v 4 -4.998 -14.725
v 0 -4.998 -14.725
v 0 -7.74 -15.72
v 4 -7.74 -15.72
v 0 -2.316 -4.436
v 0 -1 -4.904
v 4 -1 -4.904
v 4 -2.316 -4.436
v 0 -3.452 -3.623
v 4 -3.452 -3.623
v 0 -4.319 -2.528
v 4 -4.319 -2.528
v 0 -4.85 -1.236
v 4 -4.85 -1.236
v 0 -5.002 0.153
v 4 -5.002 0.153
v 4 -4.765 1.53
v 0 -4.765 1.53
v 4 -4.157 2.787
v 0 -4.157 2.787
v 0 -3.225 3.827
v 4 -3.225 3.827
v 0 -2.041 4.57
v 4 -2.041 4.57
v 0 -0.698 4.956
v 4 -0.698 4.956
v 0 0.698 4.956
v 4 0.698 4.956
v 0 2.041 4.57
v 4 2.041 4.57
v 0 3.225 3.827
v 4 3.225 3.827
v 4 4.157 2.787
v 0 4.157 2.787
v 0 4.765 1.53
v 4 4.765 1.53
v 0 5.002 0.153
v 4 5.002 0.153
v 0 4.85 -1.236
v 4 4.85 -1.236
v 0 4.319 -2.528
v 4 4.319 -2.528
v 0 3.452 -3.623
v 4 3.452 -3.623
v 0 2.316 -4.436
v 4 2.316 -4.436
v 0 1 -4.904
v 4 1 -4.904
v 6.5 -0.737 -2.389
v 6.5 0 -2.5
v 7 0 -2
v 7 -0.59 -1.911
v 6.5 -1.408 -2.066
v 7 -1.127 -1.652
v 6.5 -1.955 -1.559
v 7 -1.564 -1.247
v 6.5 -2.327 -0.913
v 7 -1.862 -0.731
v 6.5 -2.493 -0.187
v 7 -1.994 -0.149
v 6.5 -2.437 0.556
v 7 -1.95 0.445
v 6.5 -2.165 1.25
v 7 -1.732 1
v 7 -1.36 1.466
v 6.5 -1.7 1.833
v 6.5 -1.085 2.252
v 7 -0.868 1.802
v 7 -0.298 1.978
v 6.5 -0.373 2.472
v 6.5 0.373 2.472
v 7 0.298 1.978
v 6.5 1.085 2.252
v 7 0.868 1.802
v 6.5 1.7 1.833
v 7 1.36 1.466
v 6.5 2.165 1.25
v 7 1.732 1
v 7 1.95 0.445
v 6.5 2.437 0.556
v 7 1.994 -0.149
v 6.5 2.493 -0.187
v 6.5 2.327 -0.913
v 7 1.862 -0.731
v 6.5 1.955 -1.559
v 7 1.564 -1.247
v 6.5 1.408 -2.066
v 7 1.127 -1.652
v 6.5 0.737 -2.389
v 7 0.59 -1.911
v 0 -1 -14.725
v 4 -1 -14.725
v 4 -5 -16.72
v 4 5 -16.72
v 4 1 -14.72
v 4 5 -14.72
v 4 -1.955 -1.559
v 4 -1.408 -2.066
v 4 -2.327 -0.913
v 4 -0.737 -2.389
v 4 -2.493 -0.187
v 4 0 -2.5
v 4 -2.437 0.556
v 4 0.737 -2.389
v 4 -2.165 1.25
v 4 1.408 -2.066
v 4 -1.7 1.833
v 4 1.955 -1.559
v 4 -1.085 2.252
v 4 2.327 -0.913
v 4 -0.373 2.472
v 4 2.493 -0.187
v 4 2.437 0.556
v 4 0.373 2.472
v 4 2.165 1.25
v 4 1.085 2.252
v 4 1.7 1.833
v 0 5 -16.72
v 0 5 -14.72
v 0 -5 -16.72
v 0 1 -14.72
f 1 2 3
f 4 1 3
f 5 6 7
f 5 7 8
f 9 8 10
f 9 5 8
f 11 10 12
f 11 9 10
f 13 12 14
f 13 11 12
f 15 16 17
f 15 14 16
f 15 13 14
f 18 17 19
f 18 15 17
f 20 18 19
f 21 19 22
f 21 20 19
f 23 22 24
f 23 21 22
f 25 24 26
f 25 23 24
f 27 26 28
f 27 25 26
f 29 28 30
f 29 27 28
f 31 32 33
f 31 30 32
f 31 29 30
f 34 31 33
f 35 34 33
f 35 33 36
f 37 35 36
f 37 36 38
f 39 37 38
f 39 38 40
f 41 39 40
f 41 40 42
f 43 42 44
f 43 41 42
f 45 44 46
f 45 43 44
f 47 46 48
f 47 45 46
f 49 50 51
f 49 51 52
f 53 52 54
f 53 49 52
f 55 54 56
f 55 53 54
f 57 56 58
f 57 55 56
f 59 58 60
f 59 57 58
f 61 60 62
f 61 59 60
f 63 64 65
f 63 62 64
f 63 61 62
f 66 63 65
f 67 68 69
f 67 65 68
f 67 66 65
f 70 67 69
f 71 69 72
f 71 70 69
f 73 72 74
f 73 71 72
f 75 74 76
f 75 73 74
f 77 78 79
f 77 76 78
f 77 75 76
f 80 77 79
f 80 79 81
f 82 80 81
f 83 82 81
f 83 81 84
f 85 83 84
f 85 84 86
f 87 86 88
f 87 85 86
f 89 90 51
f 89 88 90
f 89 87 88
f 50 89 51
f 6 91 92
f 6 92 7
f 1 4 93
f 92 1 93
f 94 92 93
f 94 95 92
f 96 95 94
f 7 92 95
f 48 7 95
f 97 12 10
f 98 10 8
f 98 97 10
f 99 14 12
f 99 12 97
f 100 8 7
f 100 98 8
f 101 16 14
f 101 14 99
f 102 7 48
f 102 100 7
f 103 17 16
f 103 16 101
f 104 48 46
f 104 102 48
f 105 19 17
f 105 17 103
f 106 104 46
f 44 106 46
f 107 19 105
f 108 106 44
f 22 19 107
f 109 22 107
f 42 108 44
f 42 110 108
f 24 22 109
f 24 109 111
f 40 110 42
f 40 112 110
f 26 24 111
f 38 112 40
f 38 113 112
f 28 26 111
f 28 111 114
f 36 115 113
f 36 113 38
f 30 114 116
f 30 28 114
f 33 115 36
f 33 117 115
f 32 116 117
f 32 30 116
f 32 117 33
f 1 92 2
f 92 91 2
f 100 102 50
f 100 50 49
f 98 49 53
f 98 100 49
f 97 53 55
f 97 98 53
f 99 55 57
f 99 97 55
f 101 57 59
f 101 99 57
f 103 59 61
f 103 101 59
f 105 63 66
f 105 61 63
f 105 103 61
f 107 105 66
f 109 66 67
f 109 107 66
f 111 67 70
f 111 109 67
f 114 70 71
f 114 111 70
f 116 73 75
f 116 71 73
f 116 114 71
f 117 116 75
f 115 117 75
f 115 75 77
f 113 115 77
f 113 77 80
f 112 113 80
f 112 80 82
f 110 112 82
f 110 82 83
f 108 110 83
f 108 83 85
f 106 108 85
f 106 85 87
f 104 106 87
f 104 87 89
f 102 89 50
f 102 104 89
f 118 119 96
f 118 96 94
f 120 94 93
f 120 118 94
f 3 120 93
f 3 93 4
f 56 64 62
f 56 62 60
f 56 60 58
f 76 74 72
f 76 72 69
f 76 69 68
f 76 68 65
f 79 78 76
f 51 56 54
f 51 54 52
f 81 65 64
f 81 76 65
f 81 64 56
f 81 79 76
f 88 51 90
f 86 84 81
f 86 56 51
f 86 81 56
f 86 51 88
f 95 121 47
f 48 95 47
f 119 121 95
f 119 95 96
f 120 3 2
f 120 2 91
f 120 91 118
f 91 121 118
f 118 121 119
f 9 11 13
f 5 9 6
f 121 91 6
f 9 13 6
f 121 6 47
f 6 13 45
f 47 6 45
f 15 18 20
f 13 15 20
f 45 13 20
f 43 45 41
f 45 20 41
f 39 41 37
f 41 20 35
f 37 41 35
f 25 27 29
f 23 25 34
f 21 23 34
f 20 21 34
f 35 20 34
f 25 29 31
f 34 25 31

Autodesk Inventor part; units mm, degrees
ref_plane "YZ Plane" through (0, 0, 0) normal (1, 0, 0) x (0, 1, 0)
ref_plane "XZ Plane" through (0, 0, 0) normal (0, 1, 0) x (-1, 0, 0)
ref_plane "XY Plane" through (0, 0, 0) normal (0, 0, 1) x (1, 0, 0)
sketch "Esboço1" plane through (0, 0, 0) normal (1, 0, 0) x (0, 1, 0)
  arc A0 (1, -4.9038) -> (-1, -4.9038) centre (0, 0) ccw
  line L0 (-1, -14.7248) -> (-1, -4.9038)
  line L1 (1, -14.72) -> (1, -4.9038)
  line L2 (1, -14.72) -> (5, -14.72)
  line L3 (5, -14.72) -> (5, -16.72)
  line L4 (5, -16.72) -> (-5, -16.72)
  line L5 (-1, -14.7248) -> (-4.9983, -14.7248)
  line L6 (-5, -16.72) -> (-7.74, -15.72)
  line L7 (-4.9983, -14.7248) -> (-7.74, -15.72)
extrude "Extrusão1" add sketch "Esboço1" along normal blind 4
sketch "Esboço2" plane through (4, 0, 0) normal (1, 0, 0) x (0, 0, -1)
  circle A0 centre (0, 0) radius 2.5
  dimension "d20" = 5
extrude "Extrusão2" add sketch "Esboço2" along normal blind 3
chamfer "Chanfro1" distance 0.5 angle 45 1 edges at (7, 0, 2.5) measured on face at (7, -0.6619, -1.2612)
